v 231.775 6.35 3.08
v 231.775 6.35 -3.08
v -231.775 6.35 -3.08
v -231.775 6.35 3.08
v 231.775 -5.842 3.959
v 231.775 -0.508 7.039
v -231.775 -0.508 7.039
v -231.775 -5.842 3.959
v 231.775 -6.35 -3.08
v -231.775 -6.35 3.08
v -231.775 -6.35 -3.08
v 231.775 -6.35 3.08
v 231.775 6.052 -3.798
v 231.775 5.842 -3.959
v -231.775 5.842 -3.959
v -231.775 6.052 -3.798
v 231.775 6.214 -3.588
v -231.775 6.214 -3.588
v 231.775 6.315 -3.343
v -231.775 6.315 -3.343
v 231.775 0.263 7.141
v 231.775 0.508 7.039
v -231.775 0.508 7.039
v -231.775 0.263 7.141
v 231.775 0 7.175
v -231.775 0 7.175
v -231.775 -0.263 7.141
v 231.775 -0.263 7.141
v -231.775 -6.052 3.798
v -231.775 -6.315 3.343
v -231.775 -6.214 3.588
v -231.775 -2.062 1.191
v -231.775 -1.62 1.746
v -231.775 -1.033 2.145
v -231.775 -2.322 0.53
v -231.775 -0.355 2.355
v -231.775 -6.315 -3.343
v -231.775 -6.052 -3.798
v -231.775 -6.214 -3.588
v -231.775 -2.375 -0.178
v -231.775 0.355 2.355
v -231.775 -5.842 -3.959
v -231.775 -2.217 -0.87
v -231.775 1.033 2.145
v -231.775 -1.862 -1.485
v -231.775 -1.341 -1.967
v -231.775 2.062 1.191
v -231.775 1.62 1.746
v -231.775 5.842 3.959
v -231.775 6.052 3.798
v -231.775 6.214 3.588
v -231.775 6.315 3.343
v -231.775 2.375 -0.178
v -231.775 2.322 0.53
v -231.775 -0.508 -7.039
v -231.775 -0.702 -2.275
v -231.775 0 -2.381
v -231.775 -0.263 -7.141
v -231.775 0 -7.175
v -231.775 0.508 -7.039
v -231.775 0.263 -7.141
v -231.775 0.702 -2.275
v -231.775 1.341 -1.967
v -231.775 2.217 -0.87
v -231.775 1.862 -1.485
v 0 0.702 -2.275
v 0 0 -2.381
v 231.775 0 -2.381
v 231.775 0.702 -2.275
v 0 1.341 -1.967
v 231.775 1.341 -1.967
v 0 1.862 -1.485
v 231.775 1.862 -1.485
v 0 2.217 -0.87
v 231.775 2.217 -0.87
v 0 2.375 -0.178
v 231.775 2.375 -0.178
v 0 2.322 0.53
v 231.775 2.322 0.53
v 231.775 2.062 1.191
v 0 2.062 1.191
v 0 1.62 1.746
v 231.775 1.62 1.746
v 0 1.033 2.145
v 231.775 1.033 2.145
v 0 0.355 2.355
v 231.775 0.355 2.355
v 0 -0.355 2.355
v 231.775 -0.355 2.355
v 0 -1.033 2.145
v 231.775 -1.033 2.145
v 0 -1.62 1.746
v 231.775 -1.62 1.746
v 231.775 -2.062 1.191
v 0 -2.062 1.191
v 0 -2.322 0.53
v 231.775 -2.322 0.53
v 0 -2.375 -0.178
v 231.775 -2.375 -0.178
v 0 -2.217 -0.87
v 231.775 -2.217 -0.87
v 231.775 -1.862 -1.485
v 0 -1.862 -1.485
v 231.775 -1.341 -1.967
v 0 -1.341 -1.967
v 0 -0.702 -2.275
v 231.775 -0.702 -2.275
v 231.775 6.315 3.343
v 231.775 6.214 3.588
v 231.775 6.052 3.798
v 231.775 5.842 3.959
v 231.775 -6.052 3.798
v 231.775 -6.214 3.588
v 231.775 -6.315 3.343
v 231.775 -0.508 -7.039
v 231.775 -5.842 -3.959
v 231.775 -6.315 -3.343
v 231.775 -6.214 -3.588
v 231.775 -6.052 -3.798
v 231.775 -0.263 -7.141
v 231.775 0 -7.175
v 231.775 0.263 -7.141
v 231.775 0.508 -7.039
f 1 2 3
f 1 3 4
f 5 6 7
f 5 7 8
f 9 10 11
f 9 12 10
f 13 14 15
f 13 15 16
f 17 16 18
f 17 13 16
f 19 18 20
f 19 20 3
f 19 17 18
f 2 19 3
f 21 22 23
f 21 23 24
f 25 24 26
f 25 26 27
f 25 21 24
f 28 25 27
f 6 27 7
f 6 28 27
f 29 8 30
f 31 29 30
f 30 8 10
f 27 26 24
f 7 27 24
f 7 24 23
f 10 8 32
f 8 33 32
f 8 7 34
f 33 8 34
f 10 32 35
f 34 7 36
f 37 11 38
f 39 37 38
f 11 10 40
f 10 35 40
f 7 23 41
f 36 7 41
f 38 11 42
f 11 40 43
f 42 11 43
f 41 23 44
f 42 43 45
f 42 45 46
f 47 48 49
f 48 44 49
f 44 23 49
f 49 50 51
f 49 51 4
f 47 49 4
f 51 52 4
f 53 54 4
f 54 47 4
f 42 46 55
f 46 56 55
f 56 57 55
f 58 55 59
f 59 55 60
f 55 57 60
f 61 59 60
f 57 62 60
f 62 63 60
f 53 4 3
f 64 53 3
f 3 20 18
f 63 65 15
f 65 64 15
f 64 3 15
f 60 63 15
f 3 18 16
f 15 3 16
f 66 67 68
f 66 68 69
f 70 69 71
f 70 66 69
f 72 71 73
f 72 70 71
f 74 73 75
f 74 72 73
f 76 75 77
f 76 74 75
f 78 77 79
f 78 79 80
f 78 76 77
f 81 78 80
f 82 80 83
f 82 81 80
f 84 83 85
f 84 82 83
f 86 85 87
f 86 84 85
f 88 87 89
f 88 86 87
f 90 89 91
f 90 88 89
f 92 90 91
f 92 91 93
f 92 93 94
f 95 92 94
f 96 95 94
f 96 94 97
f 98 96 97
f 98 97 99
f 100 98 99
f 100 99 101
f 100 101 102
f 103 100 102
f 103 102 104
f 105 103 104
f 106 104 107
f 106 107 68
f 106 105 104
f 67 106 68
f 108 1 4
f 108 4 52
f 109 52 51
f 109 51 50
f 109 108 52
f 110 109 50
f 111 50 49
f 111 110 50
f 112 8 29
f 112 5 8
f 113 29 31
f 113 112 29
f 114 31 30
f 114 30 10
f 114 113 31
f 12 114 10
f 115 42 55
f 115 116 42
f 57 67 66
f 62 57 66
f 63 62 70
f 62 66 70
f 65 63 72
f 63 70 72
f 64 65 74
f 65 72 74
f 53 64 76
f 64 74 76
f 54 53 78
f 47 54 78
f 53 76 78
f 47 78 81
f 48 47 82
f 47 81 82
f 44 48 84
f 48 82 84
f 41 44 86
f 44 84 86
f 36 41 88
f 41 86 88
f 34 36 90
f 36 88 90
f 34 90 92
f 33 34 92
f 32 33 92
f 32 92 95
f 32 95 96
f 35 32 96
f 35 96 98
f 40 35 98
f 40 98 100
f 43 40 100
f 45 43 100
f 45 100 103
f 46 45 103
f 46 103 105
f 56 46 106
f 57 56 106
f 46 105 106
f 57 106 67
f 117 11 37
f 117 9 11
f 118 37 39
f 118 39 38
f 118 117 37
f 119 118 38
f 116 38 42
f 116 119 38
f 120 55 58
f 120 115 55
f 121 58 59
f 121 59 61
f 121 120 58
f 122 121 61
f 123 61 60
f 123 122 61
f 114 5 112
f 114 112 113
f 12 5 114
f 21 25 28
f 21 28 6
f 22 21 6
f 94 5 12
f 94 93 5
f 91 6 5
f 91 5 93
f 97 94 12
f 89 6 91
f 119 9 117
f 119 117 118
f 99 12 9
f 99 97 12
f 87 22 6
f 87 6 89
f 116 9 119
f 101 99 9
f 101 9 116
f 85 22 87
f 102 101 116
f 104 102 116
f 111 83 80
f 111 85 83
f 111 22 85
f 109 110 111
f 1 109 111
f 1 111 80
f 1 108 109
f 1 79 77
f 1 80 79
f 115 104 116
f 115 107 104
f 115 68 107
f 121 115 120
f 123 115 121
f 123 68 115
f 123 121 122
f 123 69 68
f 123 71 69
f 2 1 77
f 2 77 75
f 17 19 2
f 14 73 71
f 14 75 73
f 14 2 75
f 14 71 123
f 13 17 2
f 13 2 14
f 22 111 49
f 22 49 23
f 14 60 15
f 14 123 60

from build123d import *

# Parameters (mm, degrees)
SKETCH1_R                = 2.38125
BOSS_EXTRUDE1_DEPTH      = 231.775
BOSS_EXTRUDE1_DEPTH_BACK = 231.775


with BuildPart() as part:
    # Sketch1 → Boss-Extrude1 (new body, two sides)
    with BuildSketch(Plane(origin=(0, 0, 0), x_dir=(0, 0, -1), z_dir=(1, 0, 0))) as boss_extrude1_sk:
        with BuildLine():
            Line((7.039054482, 0.508), (3.959468146, 5.842))
            ThreePointArc((3.959468146, 5.842), (3.587586336, 6.21388181), (3.079586336, 6.35))
            Line((3.079586336, 6.35), (-3.079586336, 6.35))
            ThreePointArc((-3.079586336, 6.35), (-3.587586336, 6.21388181), (-3.959468146, 5.842))
            Line((-3.959468146, 5.842), (-7.039054482, 0.508))
            ThreePointArc((-7.039054482, 0.508), (-7.175172672, 0), (-7.039054482, -0.508))
            Line((-7.039054482, -0.508), (-3.959468146, -5.842))
            ThreePointArc((-3.959468146, -5.842), (-3.587586336, -6.21388181), (-3.079586336, -6.35))
            Line((-3.079586336, -6.35), (3.079586336, -6.35))
            ThreePointArc((3.079586336, -6.35), (3.587586336, -6.21388181), (3.959468146, -5.842))
            Line((3.959468146, -5.842), (7.039054482, -0.508))
            ThreePointArc((7.039054482, -0.508), (7.175172672, 0), (7.039054482, 0.508))
        make_face()
        Circle(SKETCH1_R, mode=Mode.SUBTRACT)
    extrude(amount=BOSS_EXTRUDE1_DEPTH)
    extrude(boss_extrude1_sk.sketch, amount=-BOSS_EXTRUDE1_DEPTH_BACK)


solid = part.part
